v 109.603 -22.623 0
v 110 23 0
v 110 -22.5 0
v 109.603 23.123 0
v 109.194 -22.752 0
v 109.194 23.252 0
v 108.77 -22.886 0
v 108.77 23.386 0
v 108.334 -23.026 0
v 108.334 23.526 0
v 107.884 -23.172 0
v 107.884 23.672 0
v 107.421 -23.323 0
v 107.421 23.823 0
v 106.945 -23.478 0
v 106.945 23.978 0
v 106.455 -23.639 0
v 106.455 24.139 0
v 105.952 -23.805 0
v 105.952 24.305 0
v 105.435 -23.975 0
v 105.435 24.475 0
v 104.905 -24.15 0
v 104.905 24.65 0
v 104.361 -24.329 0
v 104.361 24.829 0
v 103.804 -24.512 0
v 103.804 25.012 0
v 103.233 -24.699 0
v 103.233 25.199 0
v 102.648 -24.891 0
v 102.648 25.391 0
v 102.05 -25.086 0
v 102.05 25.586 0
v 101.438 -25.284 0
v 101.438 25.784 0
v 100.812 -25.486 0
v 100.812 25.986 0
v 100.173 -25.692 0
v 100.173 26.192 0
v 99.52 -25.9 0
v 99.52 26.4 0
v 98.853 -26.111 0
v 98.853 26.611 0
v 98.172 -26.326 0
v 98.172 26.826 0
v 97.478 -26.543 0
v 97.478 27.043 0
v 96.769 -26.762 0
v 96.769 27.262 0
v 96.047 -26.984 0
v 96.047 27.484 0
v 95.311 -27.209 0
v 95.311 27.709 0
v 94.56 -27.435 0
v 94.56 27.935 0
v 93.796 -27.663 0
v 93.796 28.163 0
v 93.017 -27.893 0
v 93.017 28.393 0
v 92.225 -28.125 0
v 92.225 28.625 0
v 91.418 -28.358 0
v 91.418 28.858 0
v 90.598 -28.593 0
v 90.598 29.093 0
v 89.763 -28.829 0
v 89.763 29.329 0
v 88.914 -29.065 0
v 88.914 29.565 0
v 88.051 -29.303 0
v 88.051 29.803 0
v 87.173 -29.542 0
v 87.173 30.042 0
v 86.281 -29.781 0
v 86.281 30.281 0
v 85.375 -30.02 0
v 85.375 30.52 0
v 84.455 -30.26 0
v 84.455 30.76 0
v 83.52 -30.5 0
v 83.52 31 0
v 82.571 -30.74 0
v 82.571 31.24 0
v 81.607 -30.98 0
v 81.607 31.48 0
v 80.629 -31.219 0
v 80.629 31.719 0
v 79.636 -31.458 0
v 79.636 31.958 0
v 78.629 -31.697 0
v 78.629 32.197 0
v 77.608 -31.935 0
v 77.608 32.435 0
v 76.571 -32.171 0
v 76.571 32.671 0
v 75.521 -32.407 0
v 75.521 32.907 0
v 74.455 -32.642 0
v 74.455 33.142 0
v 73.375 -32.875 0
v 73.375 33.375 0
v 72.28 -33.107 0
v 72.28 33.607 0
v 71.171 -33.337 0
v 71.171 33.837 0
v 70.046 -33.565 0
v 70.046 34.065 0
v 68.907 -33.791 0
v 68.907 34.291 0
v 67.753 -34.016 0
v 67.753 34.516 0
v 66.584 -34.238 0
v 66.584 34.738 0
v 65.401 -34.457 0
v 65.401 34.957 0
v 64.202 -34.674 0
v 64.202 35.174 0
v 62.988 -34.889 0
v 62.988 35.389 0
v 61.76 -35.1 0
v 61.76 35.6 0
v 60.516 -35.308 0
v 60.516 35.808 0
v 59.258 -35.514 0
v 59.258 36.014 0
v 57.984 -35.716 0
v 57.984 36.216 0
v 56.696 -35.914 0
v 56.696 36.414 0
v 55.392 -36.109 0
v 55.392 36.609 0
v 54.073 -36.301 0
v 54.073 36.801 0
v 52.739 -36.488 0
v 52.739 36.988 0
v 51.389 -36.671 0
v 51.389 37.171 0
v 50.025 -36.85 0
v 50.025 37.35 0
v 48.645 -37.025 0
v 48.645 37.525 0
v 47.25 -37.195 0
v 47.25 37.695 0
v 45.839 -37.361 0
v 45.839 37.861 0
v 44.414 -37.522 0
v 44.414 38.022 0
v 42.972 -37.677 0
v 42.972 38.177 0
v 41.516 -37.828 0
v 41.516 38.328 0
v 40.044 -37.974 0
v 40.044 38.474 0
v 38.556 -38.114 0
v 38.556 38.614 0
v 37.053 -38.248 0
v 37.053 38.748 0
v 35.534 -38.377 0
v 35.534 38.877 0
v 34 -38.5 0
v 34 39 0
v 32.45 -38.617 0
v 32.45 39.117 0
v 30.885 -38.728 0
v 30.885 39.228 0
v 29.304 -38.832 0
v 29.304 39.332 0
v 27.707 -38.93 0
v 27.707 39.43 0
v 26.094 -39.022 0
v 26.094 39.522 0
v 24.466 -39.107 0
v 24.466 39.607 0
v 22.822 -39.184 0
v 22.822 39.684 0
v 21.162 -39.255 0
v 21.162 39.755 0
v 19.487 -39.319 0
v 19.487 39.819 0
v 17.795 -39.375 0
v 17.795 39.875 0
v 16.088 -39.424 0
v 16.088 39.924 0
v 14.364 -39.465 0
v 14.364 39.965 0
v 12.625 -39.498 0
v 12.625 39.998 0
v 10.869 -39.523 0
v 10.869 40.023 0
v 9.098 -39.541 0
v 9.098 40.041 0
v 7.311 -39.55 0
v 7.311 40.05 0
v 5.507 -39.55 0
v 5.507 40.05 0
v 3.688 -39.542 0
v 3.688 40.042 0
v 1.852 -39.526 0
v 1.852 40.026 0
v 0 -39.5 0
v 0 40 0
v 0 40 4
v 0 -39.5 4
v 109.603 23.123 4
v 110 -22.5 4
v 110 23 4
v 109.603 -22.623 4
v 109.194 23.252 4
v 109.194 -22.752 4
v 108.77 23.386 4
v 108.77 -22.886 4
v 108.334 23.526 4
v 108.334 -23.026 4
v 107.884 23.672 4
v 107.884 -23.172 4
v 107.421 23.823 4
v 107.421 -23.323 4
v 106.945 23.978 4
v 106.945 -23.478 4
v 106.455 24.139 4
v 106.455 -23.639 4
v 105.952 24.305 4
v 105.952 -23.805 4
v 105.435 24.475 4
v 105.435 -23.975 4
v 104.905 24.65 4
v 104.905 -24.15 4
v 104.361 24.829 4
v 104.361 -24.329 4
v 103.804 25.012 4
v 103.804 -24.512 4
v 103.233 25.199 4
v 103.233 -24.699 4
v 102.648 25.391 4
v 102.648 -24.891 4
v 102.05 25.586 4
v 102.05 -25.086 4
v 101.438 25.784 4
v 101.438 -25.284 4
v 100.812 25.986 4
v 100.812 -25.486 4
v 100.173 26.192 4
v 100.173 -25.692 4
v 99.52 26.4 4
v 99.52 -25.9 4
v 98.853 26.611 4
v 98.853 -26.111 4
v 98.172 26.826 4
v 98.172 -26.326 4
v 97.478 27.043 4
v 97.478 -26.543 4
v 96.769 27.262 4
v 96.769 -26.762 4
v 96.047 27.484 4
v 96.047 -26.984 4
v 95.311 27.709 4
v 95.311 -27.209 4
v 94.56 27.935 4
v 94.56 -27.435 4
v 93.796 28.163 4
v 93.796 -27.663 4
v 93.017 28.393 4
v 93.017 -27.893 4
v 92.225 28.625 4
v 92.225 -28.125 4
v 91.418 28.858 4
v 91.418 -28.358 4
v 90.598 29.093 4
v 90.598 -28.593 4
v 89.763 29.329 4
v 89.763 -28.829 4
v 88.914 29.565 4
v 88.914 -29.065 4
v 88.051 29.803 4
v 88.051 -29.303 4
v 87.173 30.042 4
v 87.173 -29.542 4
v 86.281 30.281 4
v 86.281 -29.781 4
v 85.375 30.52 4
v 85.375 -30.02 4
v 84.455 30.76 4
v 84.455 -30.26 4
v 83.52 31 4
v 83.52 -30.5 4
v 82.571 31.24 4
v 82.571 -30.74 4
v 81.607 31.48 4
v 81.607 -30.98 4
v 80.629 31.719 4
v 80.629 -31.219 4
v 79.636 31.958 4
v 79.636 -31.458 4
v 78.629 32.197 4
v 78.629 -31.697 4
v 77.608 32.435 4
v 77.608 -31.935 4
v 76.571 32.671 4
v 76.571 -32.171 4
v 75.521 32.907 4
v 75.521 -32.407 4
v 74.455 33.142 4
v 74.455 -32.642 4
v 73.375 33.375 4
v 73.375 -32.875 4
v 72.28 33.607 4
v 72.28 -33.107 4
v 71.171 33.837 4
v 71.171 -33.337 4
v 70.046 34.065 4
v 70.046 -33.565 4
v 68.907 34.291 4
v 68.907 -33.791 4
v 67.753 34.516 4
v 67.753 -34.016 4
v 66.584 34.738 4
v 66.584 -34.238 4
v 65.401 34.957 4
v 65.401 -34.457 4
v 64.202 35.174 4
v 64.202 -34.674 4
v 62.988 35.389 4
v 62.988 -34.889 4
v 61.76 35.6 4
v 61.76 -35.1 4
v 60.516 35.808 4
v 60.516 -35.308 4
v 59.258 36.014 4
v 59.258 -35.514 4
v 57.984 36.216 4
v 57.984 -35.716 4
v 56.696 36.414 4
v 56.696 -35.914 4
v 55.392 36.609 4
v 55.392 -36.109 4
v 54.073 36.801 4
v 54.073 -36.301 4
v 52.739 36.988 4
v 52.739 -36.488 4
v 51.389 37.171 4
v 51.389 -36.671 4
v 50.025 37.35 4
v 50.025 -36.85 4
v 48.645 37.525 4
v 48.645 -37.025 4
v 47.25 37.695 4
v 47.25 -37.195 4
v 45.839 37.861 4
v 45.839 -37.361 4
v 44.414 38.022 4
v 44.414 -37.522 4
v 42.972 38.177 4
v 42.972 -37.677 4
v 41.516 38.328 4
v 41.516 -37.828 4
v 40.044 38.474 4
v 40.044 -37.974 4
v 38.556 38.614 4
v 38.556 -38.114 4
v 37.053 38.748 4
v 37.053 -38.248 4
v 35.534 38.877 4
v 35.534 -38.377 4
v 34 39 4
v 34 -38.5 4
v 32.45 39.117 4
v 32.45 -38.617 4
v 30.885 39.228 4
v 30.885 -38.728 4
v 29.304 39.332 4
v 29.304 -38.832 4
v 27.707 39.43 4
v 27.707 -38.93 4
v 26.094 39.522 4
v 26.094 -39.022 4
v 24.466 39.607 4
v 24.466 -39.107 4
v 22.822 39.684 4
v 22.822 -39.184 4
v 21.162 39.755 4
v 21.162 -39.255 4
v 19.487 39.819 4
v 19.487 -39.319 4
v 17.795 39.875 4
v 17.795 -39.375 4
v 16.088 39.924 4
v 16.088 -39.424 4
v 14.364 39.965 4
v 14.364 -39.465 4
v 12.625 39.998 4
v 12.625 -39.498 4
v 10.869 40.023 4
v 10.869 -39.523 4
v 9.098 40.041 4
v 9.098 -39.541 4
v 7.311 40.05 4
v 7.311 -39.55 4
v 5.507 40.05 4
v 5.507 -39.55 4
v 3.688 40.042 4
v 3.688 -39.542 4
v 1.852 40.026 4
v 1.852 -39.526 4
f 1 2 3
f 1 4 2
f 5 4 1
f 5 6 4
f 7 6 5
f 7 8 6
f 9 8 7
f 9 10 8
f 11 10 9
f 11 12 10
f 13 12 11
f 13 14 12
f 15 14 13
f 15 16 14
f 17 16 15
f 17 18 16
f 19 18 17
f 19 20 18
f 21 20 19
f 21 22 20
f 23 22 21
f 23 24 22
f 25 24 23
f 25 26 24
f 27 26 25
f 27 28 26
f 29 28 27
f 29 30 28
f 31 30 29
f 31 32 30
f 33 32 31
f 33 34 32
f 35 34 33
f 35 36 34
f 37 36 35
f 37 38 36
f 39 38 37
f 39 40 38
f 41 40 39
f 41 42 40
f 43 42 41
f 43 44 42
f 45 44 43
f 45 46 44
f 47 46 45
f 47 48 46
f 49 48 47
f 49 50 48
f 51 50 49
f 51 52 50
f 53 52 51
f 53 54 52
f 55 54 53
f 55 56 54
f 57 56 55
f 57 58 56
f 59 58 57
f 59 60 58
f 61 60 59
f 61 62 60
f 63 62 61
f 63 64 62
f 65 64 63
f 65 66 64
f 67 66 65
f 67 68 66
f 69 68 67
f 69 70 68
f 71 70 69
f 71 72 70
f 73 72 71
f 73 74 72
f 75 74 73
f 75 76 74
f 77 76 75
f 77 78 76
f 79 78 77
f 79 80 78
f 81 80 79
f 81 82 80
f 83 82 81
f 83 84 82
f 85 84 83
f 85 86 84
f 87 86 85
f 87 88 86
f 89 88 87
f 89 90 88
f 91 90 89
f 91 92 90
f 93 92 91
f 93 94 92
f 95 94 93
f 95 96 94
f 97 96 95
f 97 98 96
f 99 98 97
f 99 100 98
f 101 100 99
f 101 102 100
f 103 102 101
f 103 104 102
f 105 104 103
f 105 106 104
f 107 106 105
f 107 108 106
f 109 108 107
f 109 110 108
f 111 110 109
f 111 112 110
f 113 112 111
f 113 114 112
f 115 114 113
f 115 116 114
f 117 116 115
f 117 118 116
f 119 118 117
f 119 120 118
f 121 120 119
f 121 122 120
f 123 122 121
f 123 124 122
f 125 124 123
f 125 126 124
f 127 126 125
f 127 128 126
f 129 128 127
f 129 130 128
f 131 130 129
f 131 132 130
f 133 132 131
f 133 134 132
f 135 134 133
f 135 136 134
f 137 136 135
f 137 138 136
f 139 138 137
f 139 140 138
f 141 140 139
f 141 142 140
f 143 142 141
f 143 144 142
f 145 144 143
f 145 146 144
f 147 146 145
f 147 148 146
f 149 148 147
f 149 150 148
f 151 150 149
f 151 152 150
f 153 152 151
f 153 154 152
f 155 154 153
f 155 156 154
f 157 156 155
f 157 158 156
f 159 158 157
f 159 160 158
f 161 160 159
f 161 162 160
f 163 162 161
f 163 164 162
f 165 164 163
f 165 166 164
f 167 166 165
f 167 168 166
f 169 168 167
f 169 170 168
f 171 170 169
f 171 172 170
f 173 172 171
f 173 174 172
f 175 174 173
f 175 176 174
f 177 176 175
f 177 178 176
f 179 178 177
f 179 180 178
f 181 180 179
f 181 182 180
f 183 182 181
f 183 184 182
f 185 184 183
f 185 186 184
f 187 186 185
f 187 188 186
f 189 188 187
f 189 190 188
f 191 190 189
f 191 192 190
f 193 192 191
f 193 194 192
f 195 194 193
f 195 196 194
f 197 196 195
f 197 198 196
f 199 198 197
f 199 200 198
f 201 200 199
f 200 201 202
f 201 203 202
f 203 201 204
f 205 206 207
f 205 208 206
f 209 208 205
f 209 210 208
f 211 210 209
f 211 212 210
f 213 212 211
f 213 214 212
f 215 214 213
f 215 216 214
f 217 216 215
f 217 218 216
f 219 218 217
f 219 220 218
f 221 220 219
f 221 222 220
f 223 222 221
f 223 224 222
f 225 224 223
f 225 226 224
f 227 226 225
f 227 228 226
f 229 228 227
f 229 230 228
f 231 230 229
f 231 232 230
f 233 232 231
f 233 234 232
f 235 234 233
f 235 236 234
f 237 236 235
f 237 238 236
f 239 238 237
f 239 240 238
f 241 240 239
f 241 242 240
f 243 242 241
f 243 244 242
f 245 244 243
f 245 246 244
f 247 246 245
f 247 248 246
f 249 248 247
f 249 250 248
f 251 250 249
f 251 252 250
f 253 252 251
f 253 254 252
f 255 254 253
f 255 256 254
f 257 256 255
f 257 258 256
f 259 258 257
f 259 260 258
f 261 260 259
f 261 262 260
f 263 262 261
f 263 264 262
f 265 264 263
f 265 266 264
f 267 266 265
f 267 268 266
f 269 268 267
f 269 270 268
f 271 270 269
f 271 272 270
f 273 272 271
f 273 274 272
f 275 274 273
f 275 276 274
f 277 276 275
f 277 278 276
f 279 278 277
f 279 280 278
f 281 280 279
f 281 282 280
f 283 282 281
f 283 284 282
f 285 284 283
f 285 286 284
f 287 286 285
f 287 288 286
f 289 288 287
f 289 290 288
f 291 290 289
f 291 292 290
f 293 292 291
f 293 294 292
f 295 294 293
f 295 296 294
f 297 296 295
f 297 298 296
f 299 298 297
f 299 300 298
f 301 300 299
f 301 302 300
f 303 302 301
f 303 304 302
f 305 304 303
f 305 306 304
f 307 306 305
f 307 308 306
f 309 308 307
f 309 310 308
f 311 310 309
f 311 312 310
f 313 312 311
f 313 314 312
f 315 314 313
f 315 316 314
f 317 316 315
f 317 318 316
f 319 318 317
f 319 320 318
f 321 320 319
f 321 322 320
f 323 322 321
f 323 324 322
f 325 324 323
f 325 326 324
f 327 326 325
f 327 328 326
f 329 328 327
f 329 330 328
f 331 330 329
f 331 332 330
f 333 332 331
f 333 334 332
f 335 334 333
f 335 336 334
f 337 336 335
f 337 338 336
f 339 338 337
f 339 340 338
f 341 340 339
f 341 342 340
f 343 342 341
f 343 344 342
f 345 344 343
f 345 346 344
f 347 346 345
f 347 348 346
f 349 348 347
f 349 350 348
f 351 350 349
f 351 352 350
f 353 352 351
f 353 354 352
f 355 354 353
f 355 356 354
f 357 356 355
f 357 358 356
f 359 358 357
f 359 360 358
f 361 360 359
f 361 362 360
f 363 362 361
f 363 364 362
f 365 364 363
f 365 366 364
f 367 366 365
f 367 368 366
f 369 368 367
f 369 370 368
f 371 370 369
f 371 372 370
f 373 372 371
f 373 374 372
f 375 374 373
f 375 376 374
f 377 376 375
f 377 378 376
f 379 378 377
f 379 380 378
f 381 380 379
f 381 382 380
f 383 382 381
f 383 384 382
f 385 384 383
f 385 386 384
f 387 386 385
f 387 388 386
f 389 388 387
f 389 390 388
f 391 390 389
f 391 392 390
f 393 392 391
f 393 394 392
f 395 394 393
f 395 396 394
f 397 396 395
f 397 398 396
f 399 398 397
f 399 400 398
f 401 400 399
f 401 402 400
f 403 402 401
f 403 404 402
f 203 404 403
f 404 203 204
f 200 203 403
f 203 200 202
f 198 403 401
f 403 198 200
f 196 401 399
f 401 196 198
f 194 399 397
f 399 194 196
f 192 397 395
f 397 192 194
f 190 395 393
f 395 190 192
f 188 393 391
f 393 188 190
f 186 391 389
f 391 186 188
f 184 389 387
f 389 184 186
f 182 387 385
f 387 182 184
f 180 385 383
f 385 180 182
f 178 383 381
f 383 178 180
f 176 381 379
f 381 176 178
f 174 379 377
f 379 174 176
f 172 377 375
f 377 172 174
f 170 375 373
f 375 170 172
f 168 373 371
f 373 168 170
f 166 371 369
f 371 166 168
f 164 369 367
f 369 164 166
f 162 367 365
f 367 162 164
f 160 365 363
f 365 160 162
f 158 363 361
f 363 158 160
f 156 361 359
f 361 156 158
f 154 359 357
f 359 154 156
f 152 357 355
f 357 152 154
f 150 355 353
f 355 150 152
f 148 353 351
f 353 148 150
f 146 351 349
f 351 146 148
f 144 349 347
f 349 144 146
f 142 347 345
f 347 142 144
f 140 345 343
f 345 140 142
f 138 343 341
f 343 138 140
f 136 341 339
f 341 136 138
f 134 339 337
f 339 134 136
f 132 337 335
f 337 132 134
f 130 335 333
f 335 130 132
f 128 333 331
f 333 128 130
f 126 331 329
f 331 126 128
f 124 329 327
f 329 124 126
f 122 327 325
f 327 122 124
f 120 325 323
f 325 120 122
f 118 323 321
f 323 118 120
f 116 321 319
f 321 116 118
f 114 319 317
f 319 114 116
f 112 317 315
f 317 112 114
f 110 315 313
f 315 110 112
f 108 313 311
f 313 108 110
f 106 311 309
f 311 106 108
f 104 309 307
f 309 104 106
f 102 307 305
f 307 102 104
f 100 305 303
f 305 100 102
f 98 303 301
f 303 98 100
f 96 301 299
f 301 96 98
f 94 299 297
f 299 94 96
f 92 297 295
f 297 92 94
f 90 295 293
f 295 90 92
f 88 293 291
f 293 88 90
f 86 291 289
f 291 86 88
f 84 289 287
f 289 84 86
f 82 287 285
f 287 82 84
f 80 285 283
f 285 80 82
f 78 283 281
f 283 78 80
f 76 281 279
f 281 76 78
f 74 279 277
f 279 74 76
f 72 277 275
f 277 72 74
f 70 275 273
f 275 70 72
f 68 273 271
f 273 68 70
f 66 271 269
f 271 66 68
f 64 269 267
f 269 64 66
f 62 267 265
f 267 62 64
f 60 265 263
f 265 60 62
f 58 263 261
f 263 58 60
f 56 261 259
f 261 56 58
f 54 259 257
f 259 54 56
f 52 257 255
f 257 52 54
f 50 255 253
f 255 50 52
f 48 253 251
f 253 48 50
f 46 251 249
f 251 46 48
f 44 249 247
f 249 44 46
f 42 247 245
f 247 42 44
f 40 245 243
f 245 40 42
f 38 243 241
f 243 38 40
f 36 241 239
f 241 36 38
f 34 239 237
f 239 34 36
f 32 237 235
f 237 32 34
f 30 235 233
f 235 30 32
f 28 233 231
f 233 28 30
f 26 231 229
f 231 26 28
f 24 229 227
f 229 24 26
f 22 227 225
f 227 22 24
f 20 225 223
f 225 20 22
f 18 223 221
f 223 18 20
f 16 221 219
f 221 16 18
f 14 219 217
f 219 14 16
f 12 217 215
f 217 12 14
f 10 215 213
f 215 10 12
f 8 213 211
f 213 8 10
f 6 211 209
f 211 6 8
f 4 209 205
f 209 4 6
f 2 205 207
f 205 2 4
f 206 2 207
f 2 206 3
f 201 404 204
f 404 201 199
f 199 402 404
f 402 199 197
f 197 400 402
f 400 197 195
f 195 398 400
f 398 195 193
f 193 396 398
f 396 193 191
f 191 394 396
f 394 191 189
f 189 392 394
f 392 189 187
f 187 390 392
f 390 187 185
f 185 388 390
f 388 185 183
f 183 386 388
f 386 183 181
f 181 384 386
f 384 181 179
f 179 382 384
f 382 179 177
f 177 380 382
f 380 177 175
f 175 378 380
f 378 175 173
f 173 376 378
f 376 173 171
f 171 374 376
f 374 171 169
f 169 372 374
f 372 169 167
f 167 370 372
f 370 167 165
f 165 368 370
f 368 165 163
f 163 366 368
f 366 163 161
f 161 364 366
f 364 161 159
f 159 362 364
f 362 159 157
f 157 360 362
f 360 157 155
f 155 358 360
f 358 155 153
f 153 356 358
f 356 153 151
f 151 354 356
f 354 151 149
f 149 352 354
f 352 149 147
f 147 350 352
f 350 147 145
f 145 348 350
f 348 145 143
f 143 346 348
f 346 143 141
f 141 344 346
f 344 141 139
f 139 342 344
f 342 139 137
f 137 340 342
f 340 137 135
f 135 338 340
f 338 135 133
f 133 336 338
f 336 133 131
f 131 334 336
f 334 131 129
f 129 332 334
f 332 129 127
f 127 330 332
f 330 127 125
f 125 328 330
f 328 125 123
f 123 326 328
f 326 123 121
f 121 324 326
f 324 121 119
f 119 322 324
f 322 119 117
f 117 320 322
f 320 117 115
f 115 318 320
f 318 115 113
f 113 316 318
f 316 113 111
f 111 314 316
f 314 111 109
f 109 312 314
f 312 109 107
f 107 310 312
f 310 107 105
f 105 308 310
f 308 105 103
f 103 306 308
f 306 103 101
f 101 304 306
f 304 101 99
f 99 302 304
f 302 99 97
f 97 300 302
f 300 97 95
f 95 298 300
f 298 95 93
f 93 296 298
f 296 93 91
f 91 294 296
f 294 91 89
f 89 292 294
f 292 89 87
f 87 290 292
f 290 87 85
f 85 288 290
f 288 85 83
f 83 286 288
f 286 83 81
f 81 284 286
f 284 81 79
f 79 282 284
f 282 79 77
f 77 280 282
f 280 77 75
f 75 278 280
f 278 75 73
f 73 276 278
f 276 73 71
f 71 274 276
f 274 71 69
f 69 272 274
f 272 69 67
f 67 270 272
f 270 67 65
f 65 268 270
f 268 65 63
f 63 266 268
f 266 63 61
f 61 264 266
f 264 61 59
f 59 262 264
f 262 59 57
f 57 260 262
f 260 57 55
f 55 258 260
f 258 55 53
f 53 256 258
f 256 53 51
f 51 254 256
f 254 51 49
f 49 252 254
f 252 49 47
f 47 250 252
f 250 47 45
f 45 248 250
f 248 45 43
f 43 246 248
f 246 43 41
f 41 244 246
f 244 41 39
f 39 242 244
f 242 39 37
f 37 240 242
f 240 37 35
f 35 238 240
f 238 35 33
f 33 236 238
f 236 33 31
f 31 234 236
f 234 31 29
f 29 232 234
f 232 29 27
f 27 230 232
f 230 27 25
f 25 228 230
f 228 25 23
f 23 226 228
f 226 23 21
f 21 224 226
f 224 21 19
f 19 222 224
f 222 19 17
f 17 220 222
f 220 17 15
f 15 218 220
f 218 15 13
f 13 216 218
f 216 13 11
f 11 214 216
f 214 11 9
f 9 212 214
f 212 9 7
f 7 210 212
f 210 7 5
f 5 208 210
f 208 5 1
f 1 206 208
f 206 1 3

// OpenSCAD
// file: bezier.scad
//=====================================
// This is public Domain Code
// Contributed by: William A Adams
//
// This is from http://www.thingiverse.com/thing:8454
// See also: http://williamaadams.wordpress.com/2011/05/12/mr-bezier-goes-to-openscad/
//=====================================
joinfactor = 0.125;

gSteps = 100;
gHeight = 4;

//======================================
// Demos
//======================================
//BezCubicFilletColored( [[0, 15],[5,5],[10,5],[15,15]], [7.5,12], gSteps, gHeight, 
//	[[1,0,0],[1,1,0],[0,1,1],[0,0,1]]);
//BezCubicFilletColored( [[0, 15],[5,5],[10,5],[15,15]], [7.5,18], gSteps, gHeight, 
//	[[1,0,0],[0,1,0],[0,1,0],[0,0,1]]);
//DrawCubicControlPoints([[0, 15],[5,5],[10,5],[15,15]], [7.5,18], gHeight, $fn=12);

//BezCubicFillet( [[0, 5],[5,15],[10,3],[15,10]], [7.5,0], gSteps, gHeight);
//DrawCubicControlPoints( [[0, 5],[5,15],[10,3],[15,10]], [7.5,0], gHeight, $fn=12);

//BezCubicRibbon([[0,15],[6,13],[3,5],[15,0]], [[0,13],[6,11],[3,2],[13,0]]);

//=======================================
// Functions
// These are the 4 blending functions for a cubic bezier curve
//=======================================
// Bernstein Polynomials
function BEZ03(u) = pow((1-u), 3);
function BEZ13(u) = 3*u*(pow((1-u),2));
function BEZ23(u) = 3*(pow(u,2))*(1-u);
function BEZ33(u) = pow(u,3);

// Calculate a singe point along a cubic bezier curve
function PointOnBezCubic2D(p0, p1, p2, p3, u) = [
	BEZ03(u)*p0[0]+BEZ13(u)*p1[0]+BEZ23(u)*p2[0]+BEZ33(u)*p3[0],
	BEZ03(u)*p0[1]+BEZ13(u)*p1[1]+BEZ23(u)*p2[1]+BEZ33(u)*p3[1]];

function PointOnBezCubic3D(p0, p1, p2, p3, u) = [
	BEZ03(u)*p0[0]+BEZ13(u)*p1[0]+BEZ23(u)*p2[0]+BEZ33(u)*p3[0],
	BEZ03(u)*p0[1]+BEZ13(u)*p1[1]+BEZ23(u)*p2[1]+BEZ33(u)*p3[1],
	BEZ03(u)*p0[2]+BEZ13(u)*p1[2]+BEZ23(u)*p2[2]+BEZ33(u)*p3[2]];

//=======================================
// Modules
//=======================================
// This function will extrude a bezier solid from a bezier curve
// It is a straight up prism
// c - ControlPoints
//
module BezCubicFillet(c, focalPoint, steps=gSteps, height=gHeight)
{
	for(step = [steps:1])
	{
		linear_extrude(height = height, convexity = 10) 
		polygon(
			points=[
				focalPoint,
				PointOnBezCubic2D(c[0], c[1], c[2],c[3], step/steps),
				PointOnBezCubic2D(c[0], c[1], c[2],c[3], (step-1)/steps)],
			paths=[[0,1,2,0]]
		);
	}
}

module BezCubicFilletColored(c, focalPoint, steps=gSteps, height=gHeight, colors)
{
	for(step = [steps:1])
	{
		color(PointOnBezCubic3D(colors[0], colors[1], colors[2], colors[3], step/steps))
		linear_extrude(height = height, convexity = 10) 
		polygon(
			points=[
				focalPoint,
				PointOnBezCubic2D(c[0], c[1], c[2],c[3], step/steps),
				PointOnBezCubic2D(c[0], c[1], c[2],c[3], (step-1)/steps)],
			paths=[[0,1,2,0]]
		);
	}
}


module BezCubicRibbon(c1, c2, steps=gSteps, height=gHeight, colors=[[1,0,0],[1,1,0],[0,1,1],[0,0,1]])
{
	for (step=[0:steps-1])
	{
		color(PointOnBezCubic3D(colors[0], colors[1], colors[2], colors[3], step/steps))
		linear_extrude(height = height, convexity = 10) 
		polygon(
			points=[
				PointOnBezCubic2D(c1[0], c1[1], c1[2],c1[3], step/steps),
				PointOnBezCubic2D(c2[0], c2[1], c2[2],c2[3], (step)/steps),
				PointOnBezCubic2D(c2[0], c2[1], c2[2],c2[3], (step+1)/steps),
				PointOnBezCubic2D(c1[0], c1[1], c1[2],c1[3], (step+1)/steps)],
			paths=[[0,1,2,3]]
		);

	}
}

//==============================================
// Test functions
//
// These test functions help demonstrate that the core blending
// functions actually work correctly.
//==============================================
//PlotBEZ0(100);
//PlotBEZ1(100);
//PlotBEZ2(100);
//PlotBEZ3(100);
//PlotBez4Blending();

module DrawCubicControlPoints(c, focalPoint, height)
{
	// Draw control points
	// Start point
	translate(c[0])
	color([1,0,0])
	cylinder(r=0.5, h=height+joinfactor);

	// Controll point 1
	translate(c[1])
	color([0,0,0])
	cylinder(r=0.5, h=height+joinfactor);

	// Control point 2
	translate(c[2])
	color([0,0,0])
	cylinder(r=0.5, h=height+joinfactor);

	// End Point
	translate(c[3])
	color([0,0,1])
	cylinder(r=0.5, h=height+joinfactor);


	// Draw the focal point
	translate(focalPoint)
	color([0,1,0])
	cylinder(r=0.5, h=height+joinfactor);
}

module PlotBEZ0(steps)
{
	cubeSize = 1;
	cubeHeight = steps;

	for (step=[0:steps])
	{
		translate([cubeSize*step, 0, 0])
		cube(size=[cubeSize, cubeSize, BEZ03(step/steps)*cubeHeight]);
	}	
}

module PlotBEZ1(steps)
{
	cubeSize = 1;
	cubeHeight = steps;

	for (step=[0:steps])
	{
		translate([cubeSize*step, 0, 0])
		cube(size=[cubeSize, cubeSize, BEZ13(step/steps)*cubeHeight]);
	}	
}

module PlotBEZ2(steps)
{
	cubeSize = 1;
	cubeHeight = steps;

	for (step=[0:steps])
	{
		translate([cubeSize*step, 0, 0])
		cube(size=[cubeSize, cubeSize, BEZ23(step/steps)*cubeHeight]);
	}	
}

module PlotBEZ3(steps)
{
	cubeSize = 1;
	cubeHeight = steps;

	for (step=[0:steps])
	{
		translate([cubeSize*step, 0, 0])
		cube(size=[cubeSize, cubeSize, BEZ33(step/steps)*cubeHeight]);
	}	
}

module PlotBez4Blending()
{
	sizing = 100;

	translate([0, 0, sizing + 10])
	PlotBEZ0(100);

	translate([sizing+10, 0, sizing + 10])
	PlotBEZ1(100);

	translate([0, 0, 0])
	PlotBEZ2(100);

	translate([sizing+10, 0, 0])
	PlotBEZ3(100);
}
// main file
// This is from http://www.thingiverse.com/thing:8454
// See also: http://williamaadams.wordpress.com/2011/05/12/mr-bezier-goes-to-openscad/
include <bezier.scad>

measured_points = [
    [0, 80.0/2], // x,y (mug sideways, opening to left, tracking *inside* dimensions)
    [110, 46.0/2],
    [110.0/2, 73.0/2],
    [110.0/4, 76.0/2],
    [110.0/4*3, 61.0/2],
];

/**
 * The fitted control points from curve_fitting.py
 *
    (62, 41), # P1
    (97, 27), # P2
 */
/**
 * This is the main shape of half a mug, lacking the steep curve at the very bottom
 */
module half_mug_maincurve()
{
    // Calculate and cache results, will speed up rendering especially when modifying other parameters.
    render()
    {
        union()
        {
            BezCubicFillet([measured_points[0], [62, 41], [97, 27], measured_points[1] ], [0,0]);
            cube([measured_points[1][0], measured_points[1][1], gHeight], center = false);
        }
    }
}
/**
 * Half a mug
 */
module half_mug()
{
    half_mug_maincurve();
    // TODO: Add union for the last curve and a few mm more of x-dimension lenght
}

module reflector()
{
    union()
    {
        half_mug_maincurve();
        translate([0,0.5,0])
        {
            mirror([0,1,0])
            {
                half_mug_maincurve();
            }
        }
        // TODO: Add the "bottom" of the reflector that will be bent 90degrees.
    }
}

// Output the shape, TODO: project to 2D (since we will be exporting DXF for CNC)
reflector();
